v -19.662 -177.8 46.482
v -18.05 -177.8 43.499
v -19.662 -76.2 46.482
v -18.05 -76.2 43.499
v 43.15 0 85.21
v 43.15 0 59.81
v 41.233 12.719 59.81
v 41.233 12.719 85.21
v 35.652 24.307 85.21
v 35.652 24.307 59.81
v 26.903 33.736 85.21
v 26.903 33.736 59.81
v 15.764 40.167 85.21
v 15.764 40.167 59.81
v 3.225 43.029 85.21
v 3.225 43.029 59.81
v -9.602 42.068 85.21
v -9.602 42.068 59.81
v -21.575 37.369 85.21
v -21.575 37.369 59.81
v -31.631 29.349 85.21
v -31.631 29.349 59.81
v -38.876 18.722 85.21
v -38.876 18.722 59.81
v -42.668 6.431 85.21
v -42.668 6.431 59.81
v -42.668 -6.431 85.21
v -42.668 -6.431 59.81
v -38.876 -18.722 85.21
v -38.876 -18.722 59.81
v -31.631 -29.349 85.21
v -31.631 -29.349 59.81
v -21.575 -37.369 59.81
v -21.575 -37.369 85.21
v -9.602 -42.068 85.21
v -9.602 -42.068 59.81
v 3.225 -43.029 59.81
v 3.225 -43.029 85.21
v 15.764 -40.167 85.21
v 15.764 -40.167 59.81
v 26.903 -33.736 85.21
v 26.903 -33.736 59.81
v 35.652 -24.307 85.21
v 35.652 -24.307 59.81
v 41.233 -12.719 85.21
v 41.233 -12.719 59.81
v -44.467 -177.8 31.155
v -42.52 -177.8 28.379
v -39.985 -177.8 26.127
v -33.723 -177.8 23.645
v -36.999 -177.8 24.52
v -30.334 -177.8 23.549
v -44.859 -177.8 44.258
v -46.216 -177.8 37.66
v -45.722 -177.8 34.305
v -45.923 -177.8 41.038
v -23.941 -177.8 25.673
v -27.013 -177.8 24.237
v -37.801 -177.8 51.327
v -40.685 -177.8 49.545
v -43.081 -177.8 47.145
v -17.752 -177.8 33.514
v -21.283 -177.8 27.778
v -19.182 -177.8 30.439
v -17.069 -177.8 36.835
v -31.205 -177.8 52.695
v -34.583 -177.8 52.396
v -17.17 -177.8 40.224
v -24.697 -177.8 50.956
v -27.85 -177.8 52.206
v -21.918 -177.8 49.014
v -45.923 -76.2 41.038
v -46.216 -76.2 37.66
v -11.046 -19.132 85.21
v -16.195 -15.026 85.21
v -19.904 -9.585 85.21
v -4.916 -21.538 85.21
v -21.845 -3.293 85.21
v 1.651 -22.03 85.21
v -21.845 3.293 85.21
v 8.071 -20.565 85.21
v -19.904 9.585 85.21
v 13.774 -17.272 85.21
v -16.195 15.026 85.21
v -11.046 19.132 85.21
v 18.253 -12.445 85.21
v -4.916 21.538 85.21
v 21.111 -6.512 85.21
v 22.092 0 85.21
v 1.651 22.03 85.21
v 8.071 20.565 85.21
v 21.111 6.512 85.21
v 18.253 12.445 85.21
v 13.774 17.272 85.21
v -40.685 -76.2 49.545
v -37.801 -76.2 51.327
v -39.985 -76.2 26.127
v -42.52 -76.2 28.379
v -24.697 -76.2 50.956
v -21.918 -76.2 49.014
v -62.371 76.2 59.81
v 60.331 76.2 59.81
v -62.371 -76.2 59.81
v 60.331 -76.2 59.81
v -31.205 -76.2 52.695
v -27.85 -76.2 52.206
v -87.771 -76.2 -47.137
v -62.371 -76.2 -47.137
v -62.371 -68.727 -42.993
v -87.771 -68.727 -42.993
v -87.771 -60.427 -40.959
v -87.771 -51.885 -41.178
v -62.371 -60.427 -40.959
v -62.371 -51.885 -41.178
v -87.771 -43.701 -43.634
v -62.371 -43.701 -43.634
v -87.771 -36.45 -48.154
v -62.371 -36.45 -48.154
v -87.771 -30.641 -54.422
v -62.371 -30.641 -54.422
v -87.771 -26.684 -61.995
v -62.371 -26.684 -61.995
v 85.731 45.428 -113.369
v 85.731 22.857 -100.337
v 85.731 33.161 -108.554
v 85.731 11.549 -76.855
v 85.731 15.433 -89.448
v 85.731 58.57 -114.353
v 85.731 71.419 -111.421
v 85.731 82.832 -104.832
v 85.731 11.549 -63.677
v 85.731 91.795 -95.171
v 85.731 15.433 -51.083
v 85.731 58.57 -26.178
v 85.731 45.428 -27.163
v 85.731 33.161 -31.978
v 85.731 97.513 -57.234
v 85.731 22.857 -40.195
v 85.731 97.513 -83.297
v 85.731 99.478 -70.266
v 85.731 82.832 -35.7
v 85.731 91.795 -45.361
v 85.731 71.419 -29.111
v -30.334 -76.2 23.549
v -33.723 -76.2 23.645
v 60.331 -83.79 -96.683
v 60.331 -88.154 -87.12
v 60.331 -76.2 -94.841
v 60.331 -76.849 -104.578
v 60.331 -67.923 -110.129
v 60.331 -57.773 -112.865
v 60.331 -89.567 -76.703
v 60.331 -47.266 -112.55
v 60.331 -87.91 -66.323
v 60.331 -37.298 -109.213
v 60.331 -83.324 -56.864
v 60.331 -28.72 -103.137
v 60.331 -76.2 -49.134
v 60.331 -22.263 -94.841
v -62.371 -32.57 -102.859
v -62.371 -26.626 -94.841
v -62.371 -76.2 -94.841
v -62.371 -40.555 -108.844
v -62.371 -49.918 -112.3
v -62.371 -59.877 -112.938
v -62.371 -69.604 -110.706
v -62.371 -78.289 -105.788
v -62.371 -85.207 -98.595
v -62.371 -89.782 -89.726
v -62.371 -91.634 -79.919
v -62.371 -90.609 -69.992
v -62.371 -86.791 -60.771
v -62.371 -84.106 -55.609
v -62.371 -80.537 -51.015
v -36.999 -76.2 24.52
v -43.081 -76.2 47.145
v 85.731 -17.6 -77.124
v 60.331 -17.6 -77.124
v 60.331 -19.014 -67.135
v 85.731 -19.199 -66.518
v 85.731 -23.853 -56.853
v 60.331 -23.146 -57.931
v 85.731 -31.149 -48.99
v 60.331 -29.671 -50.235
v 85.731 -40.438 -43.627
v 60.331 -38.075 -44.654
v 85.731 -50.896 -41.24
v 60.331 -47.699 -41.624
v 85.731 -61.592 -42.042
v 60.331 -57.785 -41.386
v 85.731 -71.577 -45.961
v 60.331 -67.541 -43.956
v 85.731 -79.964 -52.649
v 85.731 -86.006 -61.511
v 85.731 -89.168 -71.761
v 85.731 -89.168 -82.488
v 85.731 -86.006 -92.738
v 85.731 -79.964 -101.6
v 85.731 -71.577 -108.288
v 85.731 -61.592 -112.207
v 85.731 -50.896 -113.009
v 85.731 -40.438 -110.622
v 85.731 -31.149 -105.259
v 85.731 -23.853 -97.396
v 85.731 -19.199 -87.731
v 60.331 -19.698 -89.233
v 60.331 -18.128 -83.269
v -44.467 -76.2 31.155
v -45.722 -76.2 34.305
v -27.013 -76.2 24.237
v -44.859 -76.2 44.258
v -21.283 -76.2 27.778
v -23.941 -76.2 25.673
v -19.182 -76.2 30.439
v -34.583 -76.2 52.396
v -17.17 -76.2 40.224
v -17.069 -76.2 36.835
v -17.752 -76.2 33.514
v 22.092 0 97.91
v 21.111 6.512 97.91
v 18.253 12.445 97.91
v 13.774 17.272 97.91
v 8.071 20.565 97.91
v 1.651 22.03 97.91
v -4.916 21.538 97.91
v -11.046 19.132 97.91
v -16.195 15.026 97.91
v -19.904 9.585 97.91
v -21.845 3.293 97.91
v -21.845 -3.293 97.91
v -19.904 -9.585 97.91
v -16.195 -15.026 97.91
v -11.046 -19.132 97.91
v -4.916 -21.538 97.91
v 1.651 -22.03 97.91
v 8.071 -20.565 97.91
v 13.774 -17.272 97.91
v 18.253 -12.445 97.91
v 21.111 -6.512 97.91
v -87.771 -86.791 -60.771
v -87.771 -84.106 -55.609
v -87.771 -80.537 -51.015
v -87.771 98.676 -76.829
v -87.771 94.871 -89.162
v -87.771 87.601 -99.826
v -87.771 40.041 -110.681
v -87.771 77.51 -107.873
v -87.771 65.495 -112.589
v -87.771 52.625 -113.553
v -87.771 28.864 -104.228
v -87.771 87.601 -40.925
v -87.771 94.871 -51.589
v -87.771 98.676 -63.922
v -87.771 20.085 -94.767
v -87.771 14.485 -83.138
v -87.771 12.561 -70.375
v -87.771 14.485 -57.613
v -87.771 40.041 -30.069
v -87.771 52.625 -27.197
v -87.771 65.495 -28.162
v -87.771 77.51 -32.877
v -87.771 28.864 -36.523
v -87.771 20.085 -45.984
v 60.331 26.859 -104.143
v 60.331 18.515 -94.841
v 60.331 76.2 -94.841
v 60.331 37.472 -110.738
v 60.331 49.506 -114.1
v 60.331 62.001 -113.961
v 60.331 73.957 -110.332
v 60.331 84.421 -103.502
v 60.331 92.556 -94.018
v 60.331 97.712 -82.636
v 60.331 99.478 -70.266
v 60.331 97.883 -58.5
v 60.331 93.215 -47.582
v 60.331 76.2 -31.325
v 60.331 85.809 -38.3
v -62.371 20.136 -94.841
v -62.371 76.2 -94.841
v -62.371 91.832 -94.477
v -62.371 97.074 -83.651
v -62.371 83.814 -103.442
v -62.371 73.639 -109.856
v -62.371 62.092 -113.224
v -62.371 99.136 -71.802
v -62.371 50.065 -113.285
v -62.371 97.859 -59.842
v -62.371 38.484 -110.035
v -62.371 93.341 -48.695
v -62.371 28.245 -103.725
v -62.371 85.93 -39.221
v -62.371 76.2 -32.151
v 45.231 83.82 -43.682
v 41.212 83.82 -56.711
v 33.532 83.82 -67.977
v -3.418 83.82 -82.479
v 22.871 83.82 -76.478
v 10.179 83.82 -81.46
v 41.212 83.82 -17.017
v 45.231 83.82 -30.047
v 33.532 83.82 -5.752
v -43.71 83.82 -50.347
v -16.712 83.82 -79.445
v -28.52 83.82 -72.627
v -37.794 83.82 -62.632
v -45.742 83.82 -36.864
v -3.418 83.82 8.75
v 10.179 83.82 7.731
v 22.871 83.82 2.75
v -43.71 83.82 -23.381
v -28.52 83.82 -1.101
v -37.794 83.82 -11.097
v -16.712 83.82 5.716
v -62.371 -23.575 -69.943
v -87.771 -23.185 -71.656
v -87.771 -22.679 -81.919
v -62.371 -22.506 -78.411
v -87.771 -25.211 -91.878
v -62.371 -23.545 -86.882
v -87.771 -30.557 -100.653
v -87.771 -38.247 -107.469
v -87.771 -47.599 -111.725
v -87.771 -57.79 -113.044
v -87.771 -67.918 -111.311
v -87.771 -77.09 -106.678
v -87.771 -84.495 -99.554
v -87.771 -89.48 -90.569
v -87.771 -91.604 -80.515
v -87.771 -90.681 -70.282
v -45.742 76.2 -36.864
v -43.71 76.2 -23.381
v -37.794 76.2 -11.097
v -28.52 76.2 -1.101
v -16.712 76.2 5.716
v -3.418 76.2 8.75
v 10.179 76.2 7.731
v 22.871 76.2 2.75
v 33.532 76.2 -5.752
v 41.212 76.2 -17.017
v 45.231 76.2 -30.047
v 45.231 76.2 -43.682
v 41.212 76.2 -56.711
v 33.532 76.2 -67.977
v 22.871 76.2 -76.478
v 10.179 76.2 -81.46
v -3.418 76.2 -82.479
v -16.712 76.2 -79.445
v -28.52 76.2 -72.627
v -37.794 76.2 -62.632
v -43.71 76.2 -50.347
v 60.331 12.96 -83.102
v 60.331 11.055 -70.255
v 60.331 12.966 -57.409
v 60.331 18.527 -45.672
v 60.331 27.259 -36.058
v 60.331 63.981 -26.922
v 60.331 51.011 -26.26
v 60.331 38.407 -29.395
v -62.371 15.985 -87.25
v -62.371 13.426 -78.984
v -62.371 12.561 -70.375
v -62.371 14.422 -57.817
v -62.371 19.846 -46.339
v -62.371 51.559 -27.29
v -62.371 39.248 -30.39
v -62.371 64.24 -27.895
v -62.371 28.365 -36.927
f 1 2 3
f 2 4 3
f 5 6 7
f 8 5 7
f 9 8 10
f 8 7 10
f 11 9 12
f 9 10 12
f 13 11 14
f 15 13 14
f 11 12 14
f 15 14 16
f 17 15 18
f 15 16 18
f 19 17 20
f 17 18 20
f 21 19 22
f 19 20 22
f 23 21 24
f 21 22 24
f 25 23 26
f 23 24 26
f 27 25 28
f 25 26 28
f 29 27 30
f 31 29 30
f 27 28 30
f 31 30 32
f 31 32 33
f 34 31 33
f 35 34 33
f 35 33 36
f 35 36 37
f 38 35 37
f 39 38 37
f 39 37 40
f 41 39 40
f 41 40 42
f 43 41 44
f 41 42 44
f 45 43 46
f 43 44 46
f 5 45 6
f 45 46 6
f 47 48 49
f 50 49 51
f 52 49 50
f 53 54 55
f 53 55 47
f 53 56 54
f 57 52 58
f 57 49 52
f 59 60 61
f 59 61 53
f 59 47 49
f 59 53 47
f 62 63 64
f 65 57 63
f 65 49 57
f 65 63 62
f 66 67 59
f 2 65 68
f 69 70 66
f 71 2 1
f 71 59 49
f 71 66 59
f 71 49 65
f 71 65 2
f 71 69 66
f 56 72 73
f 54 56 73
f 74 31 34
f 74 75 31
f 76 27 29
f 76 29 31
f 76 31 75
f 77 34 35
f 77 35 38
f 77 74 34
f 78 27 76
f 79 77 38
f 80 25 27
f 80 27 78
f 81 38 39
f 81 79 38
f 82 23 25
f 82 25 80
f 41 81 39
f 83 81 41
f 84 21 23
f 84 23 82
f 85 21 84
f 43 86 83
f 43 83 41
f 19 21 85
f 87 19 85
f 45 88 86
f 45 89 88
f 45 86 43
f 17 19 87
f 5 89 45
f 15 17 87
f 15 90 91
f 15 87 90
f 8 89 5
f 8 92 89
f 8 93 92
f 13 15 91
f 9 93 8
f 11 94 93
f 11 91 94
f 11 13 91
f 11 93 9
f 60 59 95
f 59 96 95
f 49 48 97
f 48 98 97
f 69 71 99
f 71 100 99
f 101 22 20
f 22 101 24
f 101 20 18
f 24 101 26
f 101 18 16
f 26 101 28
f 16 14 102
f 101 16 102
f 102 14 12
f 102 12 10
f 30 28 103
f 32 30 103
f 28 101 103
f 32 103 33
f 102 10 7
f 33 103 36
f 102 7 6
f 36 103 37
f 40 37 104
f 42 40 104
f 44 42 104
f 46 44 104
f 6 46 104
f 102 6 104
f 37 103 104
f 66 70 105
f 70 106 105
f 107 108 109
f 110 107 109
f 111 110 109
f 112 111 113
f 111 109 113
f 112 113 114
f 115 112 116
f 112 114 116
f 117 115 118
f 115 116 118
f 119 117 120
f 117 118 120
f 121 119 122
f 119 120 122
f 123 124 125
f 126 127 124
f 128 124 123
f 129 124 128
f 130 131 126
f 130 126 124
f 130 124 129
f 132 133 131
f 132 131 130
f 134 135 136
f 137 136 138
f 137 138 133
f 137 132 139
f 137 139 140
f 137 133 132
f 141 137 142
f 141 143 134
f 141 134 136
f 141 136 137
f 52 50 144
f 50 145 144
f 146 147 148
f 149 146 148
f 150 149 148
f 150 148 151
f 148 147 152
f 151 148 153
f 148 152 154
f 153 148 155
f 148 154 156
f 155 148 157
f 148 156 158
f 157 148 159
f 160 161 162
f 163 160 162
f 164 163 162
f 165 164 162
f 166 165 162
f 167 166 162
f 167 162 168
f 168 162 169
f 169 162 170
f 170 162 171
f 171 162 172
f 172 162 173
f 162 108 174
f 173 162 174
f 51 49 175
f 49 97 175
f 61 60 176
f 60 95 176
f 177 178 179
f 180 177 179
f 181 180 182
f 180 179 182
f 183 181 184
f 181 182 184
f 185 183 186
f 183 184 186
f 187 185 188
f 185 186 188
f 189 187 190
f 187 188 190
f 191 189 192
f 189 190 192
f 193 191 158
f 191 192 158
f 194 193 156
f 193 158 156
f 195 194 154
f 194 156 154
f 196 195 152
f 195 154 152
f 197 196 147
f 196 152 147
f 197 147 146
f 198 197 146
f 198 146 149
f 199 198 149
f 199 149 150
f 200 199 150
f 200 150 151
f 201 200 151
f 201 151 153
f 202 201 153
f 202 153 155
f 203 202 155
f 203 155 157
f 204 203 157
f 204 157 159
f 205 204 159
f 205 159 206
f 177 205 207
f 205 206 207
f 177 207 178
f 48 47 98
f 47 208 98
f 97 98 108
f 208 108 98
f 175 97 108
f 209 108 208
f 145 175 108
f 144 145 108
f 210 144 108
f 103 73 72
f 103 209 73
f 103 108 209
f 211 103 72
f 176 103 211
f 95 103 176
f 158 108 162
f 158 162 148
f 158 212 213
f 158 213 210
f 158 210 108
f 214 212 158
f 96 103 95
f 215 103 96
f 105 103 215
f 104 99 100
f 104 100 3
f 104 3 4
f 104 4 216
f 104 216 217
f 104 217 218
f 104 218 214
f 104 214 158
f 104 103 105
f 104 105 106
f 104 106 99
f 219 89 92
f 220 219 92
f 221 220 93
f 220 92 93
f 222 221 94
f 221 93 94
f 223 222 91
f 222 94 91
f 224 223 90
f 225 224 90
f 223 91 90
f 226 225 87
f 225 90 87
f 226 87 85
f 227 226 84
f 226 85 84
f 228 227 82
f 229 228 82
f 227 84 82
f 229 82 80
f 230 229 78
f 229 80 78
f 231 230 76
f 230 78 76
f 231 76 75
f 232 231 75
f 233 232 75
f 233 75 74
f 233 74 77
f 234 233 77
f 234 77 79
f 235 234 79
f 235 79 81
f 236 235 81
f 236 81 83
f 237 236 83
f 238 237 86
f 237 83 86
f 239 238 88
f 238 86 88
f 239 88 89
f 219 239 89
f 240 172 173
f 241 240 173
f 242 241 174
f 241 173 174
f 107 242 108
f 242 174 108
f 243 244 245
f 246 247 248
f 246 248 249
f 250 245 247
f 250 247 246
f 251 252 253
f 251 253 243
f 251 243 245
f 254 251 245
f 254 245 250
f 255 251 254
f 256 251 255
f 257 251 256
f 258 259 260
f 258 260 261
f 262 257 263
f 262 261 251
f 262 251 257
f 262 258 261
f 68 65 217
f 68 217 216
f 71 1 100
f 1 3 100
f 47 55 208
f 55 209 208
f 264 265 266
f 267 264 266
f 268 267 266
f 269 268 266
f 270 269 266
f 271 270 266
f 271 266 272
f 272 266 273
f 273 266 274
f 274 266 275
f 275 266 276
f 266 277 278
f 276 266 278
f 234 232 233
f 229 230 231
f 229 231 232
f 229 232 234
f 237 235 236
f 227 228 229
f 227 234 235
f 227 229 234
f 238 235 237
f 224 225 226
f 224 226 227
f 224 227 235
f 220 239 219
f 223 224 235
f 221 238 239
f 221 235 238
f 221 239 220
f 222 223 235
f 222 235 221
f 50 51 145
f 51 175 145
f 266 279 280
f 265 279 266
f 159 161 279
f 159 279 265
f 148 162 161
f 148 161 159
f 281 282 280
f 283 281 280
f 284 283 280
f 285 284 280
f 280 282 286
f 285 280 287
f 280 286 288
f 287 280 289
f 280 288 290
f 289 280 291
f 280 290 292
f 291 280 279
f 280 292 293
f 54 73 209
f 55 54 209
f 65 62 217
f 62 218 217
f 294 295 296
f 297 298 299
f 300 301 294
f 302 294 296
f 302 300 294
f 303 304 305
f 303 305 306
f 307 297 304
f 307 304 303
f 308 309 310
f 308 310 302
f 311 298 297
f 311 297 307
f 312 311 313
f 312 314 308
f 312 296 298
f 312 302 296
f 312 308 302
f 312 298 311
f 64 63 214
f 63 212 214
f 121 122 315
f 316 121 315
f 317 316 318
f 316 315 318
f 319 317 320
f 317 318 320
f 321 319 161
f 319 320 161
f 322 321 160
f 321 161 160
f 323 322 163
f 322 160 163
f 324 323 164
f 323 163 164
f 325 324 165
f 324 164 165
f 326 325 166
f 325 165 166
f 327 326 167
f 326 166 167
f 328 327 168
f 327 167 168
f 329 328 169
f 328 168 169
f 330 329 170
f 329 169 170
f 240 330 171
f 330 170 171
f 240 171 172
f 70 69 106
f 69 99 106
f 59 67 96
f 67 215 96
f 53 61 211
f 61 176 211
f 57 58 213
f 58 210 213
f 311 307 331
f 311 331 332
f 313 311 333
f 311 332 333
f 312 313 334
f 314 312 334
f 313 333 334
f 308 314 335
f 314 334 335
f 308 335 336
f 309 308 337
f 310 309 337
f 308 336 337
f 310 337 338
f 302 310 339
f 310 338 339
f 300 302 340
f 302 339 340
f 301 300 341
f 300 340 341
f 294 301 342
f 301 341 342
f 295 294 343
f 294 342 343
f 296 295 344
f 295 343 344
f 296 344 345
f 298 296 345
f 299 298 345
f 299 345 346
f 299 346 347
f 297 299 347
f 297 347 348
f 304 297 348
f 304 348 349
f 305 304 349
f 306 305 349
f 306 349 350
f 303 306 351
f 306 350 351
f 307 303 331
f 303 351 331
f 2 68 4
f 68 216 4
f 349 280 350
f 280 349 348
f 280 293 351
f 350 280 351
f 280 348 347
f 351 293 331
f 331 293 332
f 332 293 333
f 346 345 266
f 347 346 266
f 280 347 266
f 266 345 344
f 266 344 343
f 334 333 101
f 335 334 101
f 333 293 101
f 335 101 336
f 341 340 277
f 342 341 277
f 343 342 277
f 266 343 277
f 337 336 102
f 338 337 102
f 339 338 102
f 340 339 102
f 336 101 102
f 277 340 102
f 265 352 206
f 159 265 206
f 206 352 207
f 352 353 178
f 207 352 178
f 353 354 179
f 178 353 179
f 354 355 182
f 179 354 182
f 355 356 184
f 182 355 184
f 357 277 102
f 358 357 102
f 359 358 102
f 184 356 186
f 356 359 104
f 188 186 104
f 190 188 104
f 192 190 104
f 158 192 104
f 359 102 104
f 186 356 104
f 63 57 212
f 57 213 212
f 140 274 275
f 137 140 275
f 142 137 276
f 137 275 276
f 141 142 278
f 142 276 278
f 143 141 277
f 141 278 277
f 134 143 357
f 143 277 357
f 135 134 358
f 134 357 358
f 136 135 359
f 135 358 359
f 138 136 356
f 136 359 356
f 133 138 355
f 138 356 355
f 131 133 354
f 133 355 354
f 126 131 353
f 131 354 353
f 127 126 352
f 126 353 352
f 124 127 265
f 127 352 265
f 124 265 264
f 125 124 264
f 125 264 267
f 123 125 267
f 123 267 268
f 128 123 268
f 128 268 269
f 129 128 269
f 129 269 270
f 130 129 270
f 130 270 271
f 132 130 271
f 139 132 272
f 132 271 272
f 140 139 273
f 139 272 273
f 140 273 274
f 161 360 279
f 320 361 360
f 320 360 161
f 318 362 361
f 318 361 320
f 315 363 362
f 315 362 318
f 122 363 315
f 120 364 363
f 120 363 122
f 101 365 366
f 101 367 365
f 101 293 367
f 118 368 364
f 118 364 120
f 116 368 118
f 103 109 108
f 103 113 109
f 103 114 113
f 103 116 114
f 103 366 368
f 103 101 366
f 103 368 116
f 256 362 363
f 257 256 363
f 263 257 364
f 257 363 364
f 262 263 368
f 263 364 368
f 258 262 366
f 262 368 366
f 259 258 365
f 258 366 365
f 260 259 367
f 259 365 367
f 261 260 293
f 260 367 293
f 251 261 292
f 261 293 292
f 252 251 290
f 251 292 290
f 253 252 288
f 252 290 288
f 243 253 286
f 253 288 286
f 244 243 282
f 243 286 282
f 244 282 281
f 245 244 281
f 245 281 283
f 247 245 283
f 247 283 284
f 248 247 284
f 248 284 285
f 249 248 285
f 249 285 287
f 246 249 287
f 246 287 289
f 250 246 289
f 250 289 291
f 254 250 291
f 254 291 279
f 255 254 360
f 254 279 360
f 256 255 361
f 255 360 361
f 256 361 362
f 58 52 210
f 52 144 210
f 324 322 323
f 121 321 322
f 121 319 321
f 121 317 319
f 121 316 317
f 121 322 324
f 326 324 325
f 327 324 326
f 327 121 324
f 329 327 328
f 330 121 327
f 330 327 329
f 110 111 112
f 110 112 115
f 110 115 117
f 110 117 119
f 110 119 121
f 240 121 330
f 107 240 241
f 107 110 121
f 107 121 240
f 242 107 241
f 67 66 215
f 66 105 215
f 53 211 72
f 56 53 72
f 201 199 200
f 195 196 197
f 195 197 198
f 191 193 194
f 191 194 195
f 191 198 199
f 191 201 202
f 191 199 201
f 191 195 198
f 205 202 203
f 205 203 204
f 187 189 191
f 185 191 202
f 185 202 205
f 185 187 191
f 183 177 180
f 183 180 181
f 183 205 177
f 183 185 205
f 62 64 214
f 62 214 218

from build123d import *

# Parameters (mm, degrees)
F1_DEPTH  = 25.4
F2_DEPTH  = 127
F3_W      = 122.7013282478
F3_H      = 129.251409322
F4_DEPTH  = 76.2
F5_DEPTH  = 76.2
F6_DEPTH  = 25.4
F7_R      = 35.9848930873
F8_DEPTH  = 25.4
F9_R      = 44.2111783383
F10_DEPTH = 25.4
F13_R     = 34.5791946556
F12_R     = 32.2271478821
F14_DEPTH = 25.4
F15_R     = 43.299097817
F16_DEPTH = 25.4
F17_R     = 43.1496203252
F18_DEPTH = 25.4
F19_R     = 22.0921612012
F20_DEPTH = 12.7
F21_R     = 45.7423711287
F22_DEPTH = 7.62
F23_DEPTH = 25.4


# Not quite as in the source:
# - a feature names something its author has since deleted; it is built from what else it names


with BuildPart() as f1:
    # F0 (on Front) → F1 (new body)
    with BuildSketch(Plane.XZ):
        Polygon((-46.2158193521, 37.6598188143), (-45.7216948271, 34.3051441014), (-44.4672482626, 31.1548480371), (-42.5201071978, 28.3787638977), (-39.9852425112, 26.1265510978), (-36.9993094144, 24.5196270122), (-33.7232803334, 23.6446213344), (-30.333766844, 23.548705847), (-27.0134984958, 24.2370513787), (-23.9414718147, 25.6725490438), (-21.2833005544, 27.7778107915), (-19.1822874155, 30.4393414161), (-17.7516985602, 33.5136571128), (-17.068657404, 36.8350207265), (-17.1699868723, 40.2243766851), (-18.0502242674, 43.4990039316), (-19.6619157634, 46.4823664636), (-21.9181746546, 49.0136304347), (-24.6973654401, 50.9563347491), (-27.8496612254, 52.2057477143), (-31.2051209287, 52.6945131539), (-34.5828508489, 52.3962815967), (-37.8007566917, 51.3271307829), (-40.6853603202, 49.5446989099), (-43.0811520061, 47.1450773411), (-44.8589739995, 44.2576302965), (-45.9229834566, 41.0380207937), align=None)
    extrude(amount=F1_DEPTH)

    # F2 (add): a face of the model
    f2_faces = [f1.faces().sort_by_distance(p)[0] for p in [
        (-31.618218869, -25.4, 38.0962342024),
    ]]
    extrude(f2_faces, amount=F2_DEPTH)

    # F3 (on Front) → F4 (join)
    with BuildSketch(Plane.XZ):
        with Locations((-1.0198447853, -4.8156213015)):
            Rectangle(F3_W, F3_H)
    extrude(amount=F4_DEPTH)

    # F5 (add): a face of the model
    f5_faces = [f1.faces().sort_by_distance(p)[0] for p in [
        (-1.0198447853, 0, -4.8156213015),
    ]]
    extrude(f5_faces, amount=F5_DEPTH)

    # F6 (add): a face of the model
    f6_faces = [f1.faces().sort_by_distance(p)[0] for p in [
        (-1.0198447853, 0, -69.4413259625),
    ]]
    extrude(f6_faces, amount=F6_DEPTH)

    # F7 (on face) → F8 (join)
    with BuildSketch(Plane.YZ.offset(60.3308193386)):
        with Locations((-53.5847470164, -77.124491334)):
            Circle(F7_R)
    extrude(amount=F8_DEPTH)

    # F9 (on face) → F10 (join)
    with BuildSketch(Plane.YZ.offset(60.3308193386)):
        with Locations((55.2663691342, -70.2658891678)):
            Circle(F9_R)
    extrude(amount=F10_DEPTH)

    # F13 (on face) + F12 (on face) → F14 (join)
    with BuildSketch(Plane(origin=(-62.3705089092, 0, 0), x_dir=(0, -1, 0), z_dir=(-1, 0, 0))):
        with Locations((57.0854917169, -78.4721449018)):
            Circle(F13_R)
    with BuildSketch(Plane(origin=(-62.3705089092, 0, 0), x_dir=(0, -1, 0), z_dir=(-1, 0, 0))):
        with Locations((56.974042207, -73.0006918311)):
            Circle(F12_R)
        with BuildLine():
            Line((76.2, -94.8413259625), (76.2, -47.1365930153))
            ThreePointArc((76.2, -47.1365930153), (33.0171171216, -51.4448387729), (33.2764524277, -94.8413259625))
            Line((33.2764524277, -94.8413259625), (76.2, -94.8413259625))
        make_face()
    extrude(amount=F14_DEPTH)

    # F15 (on face) → F16 (join)
    with BuildSketch(Plane(origin=(-62.3705089092, 0, 0), x_dir=(0, -1, 0), z_dir=(-1, 0, 0))):
        with Locations((-55.8602996171, -70.3753679991)):
            Circle(F15_R)
    extrude(amount=F16_DEPTH)

    # F17 (on face) → F18 (join)
    with BuildSketch(Plane.XY.offset(59.8100833595)):
        Circle(F17_R)
    extrude(amount=F18_DEPTH)

    # F19 (on face) → F20 (join)
    with BuildSketch(Plane.XY.offset(85.2100833595)):
        Circle(F19_R)
    extrude(amount=F20_DEPTH)

    # F21 (on face) → F22 (join)
    with BuildSketch(Plane(origin=(0, 76.2, 0), x_dir=(-1, 0, 0), z_dir=(0, 1, 0))):
        with Locations((0, -36.8642732501)):
            Circle(F21_R)
    extrude(amount=F22_DEPTH)

    # F23 (add): a face of the model
    f23_faces = [f1.faces().sort_by_distance(p)[0] for p in [
        (-31.618218869, -152.4, 38.0962342024),
    ]]
    extrude(f23_faces, amount=F23_DEPTH)


solid = f1.part
